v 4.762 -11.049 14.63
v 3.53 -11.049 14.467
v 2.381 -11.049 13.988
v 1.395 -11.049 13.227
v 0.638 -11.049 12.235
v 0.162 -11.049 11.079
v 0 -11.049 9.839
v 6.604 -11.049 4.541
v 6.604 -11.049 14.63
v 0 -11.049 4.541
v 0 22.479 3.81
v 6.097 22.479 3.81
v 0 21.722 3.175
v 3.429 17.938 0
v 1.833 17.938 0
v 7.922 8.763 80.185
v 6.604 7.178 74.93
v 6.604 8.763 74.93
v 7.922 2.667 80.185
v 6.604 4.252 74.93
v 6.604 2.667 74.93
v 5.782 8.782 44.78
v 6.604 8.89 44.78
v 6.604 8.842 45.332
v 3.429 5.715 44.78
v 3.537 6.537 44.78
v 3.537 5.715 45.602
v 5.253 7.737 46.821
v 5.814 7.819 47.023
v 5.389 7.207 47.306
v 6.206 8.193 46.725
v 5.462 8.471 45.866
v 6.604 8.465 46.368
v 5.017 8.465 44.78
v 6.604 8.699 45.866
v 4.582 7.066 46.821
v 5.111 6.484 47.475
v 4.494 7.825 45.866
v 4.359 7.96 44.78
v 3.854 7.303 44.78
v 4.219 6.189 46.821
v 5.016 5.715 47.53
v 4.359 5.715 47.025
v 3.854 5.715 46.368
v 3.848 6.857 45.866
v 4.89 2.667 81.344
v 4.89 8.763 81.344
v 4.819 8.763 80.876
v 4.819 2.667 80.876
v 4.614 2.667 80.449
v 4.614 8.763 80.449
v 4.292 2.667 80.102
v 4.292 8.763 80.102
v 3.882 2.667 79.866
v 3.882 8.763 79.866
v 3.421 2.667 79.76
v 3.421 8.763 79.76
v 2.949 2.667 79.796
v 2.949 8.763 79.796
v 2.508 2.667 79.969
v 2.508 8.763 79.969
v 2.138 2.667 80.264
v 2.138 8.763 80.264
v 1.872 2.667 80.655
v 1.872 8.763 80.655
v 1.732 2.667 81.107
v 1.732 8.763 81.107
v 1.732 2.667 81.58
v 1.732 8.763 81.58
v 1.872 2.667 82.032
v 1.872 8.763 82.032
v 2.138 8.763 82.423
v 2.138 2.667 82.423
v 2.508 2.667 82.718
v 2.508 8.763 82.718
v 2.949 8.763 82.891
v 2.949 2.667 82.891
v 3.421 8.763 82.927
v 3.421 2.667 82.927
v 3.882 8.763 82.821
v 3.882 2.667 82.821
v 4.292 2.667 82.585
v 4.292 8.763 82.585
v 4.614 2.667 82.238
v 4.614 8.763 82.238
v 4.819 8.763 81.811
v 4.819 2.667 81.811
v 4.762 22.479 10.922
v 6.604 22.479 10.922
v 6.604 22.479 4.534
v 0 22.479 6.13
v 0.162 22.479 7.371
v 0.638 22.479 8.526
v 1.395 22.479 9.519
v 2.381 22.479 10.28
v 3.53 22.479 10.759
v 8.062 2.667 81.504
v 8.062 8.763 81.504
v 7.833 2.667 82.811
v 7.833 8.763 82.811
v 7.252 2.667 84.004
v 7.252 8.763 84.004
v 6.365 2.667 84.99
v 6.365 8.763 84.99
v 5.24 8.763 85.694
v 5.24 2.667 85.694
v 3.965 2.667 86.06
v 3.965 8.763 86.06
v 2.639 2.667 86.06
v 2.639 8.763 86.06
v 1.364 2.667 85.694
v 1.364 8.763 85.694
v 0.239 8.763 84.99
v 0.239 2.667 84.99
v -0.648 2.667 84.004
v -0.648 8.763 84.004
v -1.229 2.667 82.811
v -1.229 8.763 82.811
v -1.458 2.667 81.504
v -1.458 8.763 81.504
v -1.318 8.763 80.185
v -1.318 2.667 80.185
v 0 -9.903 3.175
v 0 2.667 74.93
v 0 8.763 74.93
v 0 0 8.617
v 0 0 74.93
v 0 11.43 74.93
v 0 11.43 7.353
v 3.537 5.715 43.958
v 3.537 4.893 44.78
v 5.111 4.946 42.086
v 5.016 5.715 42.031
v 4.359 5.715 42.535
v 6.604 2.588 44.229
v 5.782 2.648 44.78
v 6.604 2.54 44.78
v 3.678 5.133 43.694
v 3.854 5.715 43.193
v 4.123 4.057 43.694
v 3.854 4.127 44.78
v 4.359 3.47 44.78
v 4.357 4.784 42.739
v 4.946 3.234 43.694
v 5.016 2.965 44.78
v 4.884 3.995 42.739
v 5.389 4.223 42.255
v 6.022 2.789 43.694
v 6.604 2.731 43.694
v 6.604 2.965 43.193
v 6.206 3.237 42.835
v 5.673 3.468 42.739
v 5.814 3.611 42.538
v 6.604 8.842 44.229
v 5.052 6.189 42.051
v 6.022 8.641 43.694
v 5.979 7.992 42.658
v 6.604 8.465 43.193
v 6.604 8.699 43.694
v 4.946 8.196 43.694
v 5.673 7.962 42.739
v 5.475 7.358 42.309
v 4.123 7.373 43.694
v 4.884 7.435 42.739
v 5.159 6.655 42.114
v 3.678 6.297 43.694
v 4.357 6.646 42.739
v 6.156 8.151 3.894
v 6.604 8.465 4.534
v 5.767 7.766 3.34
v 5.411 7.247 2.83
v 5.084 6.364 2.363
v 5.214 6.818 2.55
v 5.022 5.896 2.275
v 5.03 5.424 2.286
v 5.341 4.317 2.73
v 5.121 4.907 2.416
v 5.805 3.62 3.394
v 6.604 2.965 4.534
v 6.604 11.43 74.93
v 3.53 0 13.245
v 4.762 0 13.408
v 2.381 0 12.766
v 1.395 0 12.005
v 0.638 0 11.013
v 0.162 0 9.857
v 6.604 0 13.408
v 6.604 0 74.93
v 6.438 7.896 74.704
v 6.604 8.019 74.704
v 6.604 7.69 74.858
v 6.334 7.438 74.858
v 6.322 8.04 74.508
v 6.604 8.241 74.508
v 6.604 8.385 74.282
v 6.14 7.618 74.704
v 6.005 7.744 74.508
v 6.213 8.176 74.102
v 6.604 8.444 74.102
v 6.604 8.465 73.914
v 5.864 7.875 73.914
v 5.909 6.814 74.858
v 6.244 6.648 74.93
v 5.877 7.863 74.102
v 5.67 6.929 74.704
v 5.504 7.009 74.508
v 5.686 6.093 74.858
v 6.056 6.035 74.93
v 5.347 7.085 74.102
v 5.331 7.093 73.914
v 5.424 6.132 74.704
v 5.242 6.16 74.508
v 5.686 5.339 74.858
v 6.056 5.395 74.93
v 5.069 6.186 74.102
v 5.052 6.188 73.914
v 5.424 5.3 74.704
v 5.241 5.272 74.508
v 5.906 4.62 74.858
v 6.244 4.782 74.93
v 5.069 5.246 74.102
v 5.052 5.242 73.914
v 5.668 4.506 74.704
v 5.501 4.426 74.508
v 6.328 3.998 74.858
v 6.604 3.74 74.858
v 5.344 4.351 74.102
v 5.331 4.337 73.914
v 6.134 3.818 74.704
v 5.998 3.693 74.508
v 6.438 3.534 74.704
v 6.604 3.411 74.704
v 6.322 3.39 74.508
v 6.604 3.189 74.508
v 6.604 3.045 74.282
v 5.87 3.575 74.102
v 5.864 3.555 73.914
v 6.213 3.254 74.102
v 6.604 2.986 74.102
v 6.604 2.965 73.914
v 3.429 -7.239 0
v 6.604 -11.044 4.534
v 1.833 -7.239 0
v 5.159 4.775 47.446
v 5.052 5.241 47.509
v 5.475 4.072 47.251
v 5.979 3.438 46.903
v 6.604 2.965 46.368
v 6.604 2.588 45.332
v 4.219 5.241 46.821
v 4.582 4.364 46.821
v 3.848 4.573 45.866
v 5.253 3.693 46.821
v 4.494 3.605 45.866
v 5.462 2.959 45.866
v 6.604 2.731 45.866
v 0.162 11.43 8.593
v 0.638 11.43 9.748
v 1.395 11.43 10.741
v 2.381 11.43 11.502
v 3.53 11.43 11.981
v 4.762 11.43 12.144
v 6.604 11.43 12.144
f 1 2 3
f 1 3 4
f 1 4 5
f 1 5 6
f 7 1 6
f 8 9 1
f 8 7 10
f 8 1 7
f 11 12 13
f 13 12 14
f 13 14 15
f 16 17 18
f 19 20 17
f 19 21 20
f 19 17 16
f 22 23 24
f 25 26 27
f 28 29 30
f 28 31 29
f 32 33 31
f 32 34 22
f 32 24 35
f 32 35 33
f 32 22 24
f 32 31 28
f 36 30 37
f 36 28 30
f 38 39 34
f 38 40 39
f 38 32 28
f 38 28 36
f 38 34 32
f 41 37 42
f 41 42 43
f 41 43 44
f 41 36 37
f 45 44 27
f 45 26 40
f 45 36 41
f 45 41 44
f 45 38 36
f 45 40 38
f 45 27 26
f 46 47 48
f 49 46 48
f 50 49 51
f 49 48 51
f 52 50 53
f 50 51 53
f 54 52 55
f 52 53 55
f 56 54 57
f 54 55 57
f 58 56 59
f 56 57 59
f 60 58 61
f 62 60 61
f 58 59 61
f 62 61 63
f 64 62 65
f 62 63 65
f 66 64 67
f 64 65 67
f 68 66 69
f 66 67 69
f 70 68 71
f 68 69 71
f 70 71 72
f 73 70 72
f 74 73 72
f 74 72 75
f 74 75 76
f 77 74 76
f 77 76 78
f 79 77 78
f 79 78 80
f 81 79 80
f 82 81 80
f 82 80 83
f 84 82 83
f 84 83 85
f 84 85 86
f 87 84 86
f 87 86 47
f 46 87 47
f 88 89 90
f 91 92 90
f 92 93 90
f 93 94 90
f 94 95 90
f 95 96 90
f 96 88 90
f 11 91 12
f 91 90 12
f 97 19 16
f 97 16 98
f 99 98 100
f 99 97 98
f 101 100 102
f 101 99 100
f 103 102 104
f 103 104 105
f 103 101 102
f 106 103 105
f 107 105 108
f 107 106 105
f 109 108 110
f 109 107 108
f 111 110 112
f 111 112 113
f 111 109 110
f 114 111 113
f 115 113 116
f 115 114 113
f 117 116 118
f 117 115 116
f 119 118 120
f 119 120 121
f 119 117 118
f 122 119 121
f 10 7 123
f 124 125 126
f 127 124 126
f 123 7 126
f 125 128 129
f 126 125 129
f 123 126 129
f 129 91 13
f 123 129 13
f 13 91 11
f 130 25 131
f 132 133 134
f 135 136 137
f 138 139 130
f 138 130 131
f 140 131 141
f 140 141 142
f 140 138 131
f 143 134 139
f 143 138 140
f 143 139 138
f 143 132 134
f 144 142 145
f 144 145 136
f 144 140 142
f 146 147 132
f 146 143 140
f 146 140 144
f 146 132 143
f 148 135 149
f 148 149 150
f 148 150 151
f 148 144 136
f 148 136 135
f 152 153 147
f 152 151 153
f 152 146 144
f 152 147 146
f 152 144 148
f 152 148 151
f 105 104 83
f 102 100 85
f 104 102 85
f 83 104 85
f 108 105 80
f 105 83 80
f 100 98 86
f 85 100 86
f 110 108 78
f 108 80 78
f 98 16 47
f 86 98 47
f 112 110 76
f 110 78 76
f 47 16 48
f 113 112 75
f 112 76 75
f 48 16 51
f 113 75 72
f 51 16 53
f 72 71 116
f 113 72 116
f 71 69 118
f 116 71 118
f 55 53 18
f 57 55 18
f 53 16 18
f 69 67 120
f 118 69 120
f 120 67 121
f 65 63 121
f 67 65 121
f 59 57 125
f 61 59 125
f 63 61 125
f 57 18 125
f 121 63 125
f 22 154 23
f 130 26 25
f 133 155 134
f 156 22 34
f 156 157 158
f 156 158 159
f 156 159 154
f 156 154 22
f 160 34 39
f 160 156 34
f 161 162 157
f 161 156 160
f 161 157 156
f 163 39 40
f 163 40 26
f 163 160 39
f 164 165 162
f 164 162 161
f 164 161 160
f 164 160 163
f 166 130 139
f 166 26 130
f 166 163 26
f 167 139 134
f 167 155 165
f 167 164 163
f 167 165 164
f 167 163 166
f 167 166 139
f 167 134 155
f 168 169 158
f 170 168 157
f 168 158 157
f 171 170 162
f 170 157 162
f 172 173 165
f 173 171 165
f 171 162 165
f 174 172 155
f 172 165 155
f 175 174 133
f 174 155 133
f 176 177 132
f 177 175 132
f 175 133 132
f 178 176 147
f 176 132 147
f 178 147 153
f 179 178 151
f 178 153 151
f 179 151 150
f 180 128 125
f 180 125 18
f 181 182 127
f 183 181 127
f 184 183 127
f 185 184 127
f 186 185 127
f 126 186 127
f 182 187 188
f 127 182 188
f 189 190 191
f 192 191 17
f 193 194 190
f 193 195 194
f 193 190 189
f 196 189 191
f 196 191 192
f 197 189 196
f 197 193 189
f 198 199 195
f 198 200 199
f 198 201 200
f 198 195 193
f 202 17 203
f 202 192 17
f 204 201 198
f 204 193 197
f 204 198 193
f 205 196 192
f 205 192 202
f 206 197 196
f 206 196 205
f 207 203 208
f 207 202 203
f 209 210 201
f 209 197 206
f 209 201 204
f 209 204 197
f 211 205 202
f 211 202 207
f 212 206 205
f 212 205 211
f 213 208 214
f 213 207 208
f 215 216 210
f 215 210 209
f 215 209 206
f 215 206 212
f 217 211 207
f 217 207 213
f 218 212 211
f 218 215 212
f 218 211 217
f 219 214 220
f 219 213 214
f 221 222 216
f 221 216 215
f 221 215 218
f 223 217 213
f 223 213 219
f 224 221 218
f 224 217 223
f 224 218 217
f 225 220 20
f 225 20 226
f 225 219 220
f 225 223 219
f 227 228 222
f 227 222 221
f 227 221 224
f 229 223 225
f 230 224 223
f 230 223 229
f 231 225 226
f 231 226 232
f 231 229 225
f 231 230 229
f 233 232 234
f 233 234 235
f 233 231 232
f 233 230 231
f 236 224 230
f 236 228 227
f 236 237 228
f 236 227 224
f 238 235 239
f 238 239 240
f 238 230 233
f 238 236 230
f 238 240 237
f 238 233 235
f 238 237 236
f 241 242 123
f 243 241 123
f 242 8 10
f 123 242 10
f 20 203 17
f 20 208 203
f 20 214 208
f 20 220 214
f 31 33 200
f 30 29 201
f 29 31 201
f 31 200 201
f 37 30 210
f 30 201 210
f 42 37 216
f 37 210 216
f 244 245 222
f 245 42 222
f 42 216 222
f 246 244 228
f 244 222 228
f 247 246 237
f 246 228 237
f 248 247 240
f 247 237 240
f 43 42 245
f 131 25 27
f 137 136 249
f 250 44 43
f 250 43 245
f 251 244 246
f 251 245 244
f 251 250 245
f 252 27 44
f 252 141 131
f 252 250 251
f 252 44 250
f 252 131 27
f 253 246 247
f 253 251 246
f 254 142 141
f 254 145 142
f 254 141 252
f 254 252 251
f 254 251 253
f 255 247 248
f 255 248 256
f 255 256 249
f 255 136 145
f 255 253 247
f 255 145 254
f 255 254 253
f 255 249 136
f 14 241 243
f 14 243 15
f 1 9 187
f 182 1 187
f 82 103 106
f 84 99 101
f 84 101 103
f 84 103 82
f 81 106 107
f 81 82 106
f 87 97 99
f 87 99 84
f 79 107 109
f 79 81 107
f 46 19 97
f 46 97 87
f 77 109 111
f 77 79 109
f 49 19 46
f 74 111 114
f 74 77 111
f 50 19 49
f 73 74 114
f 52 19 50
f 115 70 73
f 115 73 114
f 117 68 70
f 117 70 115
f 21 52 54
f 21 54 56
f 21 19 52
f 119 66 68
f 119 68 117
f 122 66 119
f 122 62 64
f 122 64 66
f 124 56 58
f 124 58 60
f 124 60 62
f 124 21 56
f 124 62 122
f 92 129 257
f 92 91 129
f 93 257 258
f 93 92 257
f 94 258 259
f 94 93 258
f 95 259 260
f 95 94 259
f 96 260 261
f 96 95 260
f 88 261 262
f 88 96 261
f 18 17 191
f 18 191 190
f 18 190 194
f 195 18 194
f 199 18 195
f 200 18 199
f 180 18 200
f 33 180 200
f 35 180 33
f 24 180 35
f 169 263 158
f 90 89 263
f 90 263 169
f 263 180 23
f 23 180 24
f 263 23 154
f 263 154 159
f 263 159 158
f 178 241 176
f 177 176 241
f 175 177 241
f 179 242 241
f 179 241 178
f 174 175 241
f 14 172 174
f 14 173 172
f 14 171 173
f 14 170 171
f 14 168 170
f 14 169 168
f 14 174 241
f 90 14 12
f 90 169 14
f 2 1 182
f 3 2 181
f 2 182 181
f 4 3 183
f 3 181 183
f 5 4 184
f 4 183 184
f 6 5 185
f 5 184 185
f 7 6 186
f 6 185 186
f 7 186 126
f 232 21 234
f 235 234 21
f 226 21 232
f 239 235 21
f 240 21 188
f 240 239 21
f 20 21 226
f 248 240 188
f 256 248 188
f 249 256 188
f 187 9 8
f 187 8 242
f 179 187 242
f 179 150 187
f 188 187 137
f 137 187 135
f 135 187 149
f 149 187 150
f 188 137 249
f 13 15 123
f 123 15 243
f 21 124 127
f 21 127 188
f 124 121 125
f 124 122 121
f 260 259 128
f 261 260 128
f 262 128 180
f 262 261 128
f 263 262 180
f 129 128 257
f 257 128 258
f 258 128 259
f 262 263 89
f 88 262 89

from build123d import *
from OCP.BRepFilletAPI import BRepFilletAPI_MakeChamfer
from build123d.topology import SkipClean

# Parameters (mm, degrees)
SKETCH1_W                    = 6.604
SKETCH1_H                    = 11.43
BOSS_EXTRUDE1_DEPTH          = 74.93
SKETCH2_W                    = 14.6304
SKETCH2_H                    = 11.049
BOSS_EXTRUDE2_DEPTH          = 6.604
CUT_EXTRUDE1_DEPTH           = 79.507471982
SKETCH4_R                    = 3.175
CUT_EXTRUDE2_DEPTH           = 79.507471982
FILLET1_R                    = 4.7625
CHAMFER1_SIZE                = 3.175
CHAMFER1_SIZE2               = 1.833087105
CHAMFER2_SIZE                = 3.175
CHAMFER2_SIZE2               = 4.534369921
CHAMFER3_SIZE                = 3.81
CHAMFER3_SIZE2               = 4.540581188
BOSS_EXTRUDE3_DEPTH          = 3.048
F_1_8_0_125_DIAMETER_HOLE1_D = 3.175
FILLET2_R                    = 1.016


with BuildPart() as part:
    # Sketch1 → Boss-Extrude1 (new body)
    with BuildSketch(Plane.XY):
        with Locations((3.302, 5.715)):
            Rectangle(SKETCH1_W, SKETCH1_H)
    extrude(amount=BOSS_EXTRUDE1_DEPTH)

    # Sketch2 → Boss-Extrude2 (add)
    with BuildSketch(Plane(origin=(6.604, 0, 0), x_dir=(0, 0, -1), z_dir=(1, 0, 0))):
        with Locations((-7.3152, -5.5245)):
            Rectangle(SKETCH2_W, SKETCH2_H)
        with Locations((-7.3152, 16.9545)):
            Rectangle(SKETCH2_W, SKETCH2_H)
    extrude(amount=-BOSS_EXTRUDE2_DEPTH)

    # Sketch3 → Cut-Extrude1 (cut, through all)
    with BuildSketch(Plane(origin=(6.604, 0, 0), x_dir=(0, 0, -1), z_dir=(1, 0, 0))):
        Polygon((-10.922, 22.479), (-14.6304, 22.479), (-14.6304, 11.43), (-12.144086364, 11.43), align=None)
        Polygon((-14.6304, 0), (-14.6304, -11.049), (-13.408313636, 0), align=None)
    extrude(amount=-CUT_EXTRUDE1_DEPTH, mode=Mode.SUBTRACT)

    # Sketch4 → Cut-Extrude2 (cut, through all)
    with BuildSketch(Plane.XY.offset(74.93)):
        with Locations((8.1915, 5.715)):
            Circle(SKETCH4_R)
    extrude(amount=-CUT_EXTRUDE2_DEPTH, mode=Mode.SUBTRACT)

    # Fillet1
    fillet1_edges = [part.edges().sort_by_distance(p)[0] for p in [
        (0, -5.5245, 14.019356818),
        (0, 16.9545, 11.533043182),
    ]]
    fillet(fillet1_edges, radius=FILLET1_R)

    # Chamfer1
    chamfer1_edges = [part.edges().sort_by_distance(p)[0] for p in [
        (0, 5.715, 0),
    ]]
    chamfer1_side = [part.faces().sort_by_distance(p)[0] for p in [
        (0, 5.39199625, 31.764871667),
    ]]
    chamfer(chamfer1_edges, length=CHAMFER1_SIZE, length2=CHAMFER1_SIZE2, reference=chamfer1_side[0])

    # Chamfer2
    chamfer2_edges = [part.edges().sort_by_distance(p)[0] for p in [
        (6.604, 15.471815329, 0),
    ]]
    chamfer2_side = [part.faces().sort_by_distance(p)[0] for p in [
        (4.148704261, 5.715, 0),
    ]]
    chamfer(chamfer2_edges, length=CHAMFER2_SIZE, length2=CHAMFER2_SIZE2, reference=chamfer2_side[0])

    # Chamfer3: one chamfer whose edges measure the first distance from different faces: ONE call of the kernel's chamfer builder (chamfer() names one face for all edges)
    chamfer3_edges_1 = [part.edges().sort_by_distance(p)[0] for p in [
        (2.631043552, 22.479, 0),
    ]]
    chamfer3_side_1 = [part.faces().sort_by_distance(p)[0] for p in [
        (3.348233995, 22.479, 5.806565438),
    ]]
    chamfer3_edges_2 = [part.edges().sort_by_distance(p)[0] for p in [
        (2.631043552, -11.049, 0),
    ]]
    chamfer3_side_2 = [part.faces().sort_by_distance(p)[0] for p in [
        (2.631043552, 5.715, 0),
    ]]
    chamfer3 = BRepFilletAPI_MakeChamfer(part.part.solid().wrapped)
    for e in chamfer3_edges_1:
        chamfer3.Add(CHAMFER3_SIZE, CHAMFER3_SIZE2, e.wrapped, chamfer3_side_1[0].wrapped)  # the first distance lies on this face
    for e in chamfer3_edges_2:
        chamfer3.Add(CHAMFER3_SIZE, CHAMFER3_SIZE2, e.wrapped, chamfer3_side_2[0].wrapped)  # the first distance lies on this face
    add(Compound.cast(chamfer3.Shape()), mode=Mode.REPLACE)

    # Sketch5 → Boss-Extrude3 (add, symmetric)
    with BuildSketch(Plane(origin=(0, 5.715, 0), x_dir=(-1, 0, 0), z_dir=(0, -1, 0))):
        with BuildLine():
            Line((0, -74.93), (-6.604, -74.93))
            Line((-6.604, -74.93), (-7.921538097, -80.185366149))
            ThreePointArc((-7.921538097, -80.185366149), (-3.302, -86.106), (1.317538097, -80.185366149))
            Line((1.317538097, -80.185366149), (0, -74.93))
        make_face()
    extrude(amount=BOSS_EXTRUDE3_DEPTH, both=True)

    # 1/8 (0.125) Diameter Hole1 (through all)
    with Locations(Plane(origin=(0, 2.667, 0), x_dir=(-1, 0, 0), z_dir=(0, -1, 0))):
        with Locations((-3.302, -81.3435)):
            Hole(F_1_8_0_125_DIAMETER_HOLE1_D / 2)

    # Fillet2
    fillet2_edges = [part.edges().sort_by_distance(p)[0] for p in [
        (5.0165, 5.715, 74.93),
    ]]
    fillet(fillet2_edges, radius=FILLET2_R)

    # Sketch8 → Cut-Revolve3 (revolve, cut)
    with SkipClean():  # the faces are left unmerged after this step: merging them gives an invalid solid
        with BuildSketch(Plane(origin=(0, 5.715, 0), x_dir=(-1, 0, 0), z_dir=(0, -1, 0))):
            with BuildLine():
                ThreePointArc((-3.429, -44.7802), (-4.35893597, -42.53513597), (-6.604, -41.6052))
                Line((-6.604, -41.6052), (-6.604, -47.9552))
                ThreePointArc((-6.604, -47.9552), (-4.35893597, -47.02526403), (-3.429, -44.7802))
            make_face()
            with BuildLine():
                Line((-6.604, -47.9552), (-6.604, -41.6052))
                ThreePointArc((-6.604, -41.6052), (-9.779, -44.7802), (-6.604, -47.9552))
            make_face()
        revolve(axis=Axis((6.604, 5.715, 14.6304), (0, 0, 1)), mode=Mode.SUBTRACT)


solid = part.part
